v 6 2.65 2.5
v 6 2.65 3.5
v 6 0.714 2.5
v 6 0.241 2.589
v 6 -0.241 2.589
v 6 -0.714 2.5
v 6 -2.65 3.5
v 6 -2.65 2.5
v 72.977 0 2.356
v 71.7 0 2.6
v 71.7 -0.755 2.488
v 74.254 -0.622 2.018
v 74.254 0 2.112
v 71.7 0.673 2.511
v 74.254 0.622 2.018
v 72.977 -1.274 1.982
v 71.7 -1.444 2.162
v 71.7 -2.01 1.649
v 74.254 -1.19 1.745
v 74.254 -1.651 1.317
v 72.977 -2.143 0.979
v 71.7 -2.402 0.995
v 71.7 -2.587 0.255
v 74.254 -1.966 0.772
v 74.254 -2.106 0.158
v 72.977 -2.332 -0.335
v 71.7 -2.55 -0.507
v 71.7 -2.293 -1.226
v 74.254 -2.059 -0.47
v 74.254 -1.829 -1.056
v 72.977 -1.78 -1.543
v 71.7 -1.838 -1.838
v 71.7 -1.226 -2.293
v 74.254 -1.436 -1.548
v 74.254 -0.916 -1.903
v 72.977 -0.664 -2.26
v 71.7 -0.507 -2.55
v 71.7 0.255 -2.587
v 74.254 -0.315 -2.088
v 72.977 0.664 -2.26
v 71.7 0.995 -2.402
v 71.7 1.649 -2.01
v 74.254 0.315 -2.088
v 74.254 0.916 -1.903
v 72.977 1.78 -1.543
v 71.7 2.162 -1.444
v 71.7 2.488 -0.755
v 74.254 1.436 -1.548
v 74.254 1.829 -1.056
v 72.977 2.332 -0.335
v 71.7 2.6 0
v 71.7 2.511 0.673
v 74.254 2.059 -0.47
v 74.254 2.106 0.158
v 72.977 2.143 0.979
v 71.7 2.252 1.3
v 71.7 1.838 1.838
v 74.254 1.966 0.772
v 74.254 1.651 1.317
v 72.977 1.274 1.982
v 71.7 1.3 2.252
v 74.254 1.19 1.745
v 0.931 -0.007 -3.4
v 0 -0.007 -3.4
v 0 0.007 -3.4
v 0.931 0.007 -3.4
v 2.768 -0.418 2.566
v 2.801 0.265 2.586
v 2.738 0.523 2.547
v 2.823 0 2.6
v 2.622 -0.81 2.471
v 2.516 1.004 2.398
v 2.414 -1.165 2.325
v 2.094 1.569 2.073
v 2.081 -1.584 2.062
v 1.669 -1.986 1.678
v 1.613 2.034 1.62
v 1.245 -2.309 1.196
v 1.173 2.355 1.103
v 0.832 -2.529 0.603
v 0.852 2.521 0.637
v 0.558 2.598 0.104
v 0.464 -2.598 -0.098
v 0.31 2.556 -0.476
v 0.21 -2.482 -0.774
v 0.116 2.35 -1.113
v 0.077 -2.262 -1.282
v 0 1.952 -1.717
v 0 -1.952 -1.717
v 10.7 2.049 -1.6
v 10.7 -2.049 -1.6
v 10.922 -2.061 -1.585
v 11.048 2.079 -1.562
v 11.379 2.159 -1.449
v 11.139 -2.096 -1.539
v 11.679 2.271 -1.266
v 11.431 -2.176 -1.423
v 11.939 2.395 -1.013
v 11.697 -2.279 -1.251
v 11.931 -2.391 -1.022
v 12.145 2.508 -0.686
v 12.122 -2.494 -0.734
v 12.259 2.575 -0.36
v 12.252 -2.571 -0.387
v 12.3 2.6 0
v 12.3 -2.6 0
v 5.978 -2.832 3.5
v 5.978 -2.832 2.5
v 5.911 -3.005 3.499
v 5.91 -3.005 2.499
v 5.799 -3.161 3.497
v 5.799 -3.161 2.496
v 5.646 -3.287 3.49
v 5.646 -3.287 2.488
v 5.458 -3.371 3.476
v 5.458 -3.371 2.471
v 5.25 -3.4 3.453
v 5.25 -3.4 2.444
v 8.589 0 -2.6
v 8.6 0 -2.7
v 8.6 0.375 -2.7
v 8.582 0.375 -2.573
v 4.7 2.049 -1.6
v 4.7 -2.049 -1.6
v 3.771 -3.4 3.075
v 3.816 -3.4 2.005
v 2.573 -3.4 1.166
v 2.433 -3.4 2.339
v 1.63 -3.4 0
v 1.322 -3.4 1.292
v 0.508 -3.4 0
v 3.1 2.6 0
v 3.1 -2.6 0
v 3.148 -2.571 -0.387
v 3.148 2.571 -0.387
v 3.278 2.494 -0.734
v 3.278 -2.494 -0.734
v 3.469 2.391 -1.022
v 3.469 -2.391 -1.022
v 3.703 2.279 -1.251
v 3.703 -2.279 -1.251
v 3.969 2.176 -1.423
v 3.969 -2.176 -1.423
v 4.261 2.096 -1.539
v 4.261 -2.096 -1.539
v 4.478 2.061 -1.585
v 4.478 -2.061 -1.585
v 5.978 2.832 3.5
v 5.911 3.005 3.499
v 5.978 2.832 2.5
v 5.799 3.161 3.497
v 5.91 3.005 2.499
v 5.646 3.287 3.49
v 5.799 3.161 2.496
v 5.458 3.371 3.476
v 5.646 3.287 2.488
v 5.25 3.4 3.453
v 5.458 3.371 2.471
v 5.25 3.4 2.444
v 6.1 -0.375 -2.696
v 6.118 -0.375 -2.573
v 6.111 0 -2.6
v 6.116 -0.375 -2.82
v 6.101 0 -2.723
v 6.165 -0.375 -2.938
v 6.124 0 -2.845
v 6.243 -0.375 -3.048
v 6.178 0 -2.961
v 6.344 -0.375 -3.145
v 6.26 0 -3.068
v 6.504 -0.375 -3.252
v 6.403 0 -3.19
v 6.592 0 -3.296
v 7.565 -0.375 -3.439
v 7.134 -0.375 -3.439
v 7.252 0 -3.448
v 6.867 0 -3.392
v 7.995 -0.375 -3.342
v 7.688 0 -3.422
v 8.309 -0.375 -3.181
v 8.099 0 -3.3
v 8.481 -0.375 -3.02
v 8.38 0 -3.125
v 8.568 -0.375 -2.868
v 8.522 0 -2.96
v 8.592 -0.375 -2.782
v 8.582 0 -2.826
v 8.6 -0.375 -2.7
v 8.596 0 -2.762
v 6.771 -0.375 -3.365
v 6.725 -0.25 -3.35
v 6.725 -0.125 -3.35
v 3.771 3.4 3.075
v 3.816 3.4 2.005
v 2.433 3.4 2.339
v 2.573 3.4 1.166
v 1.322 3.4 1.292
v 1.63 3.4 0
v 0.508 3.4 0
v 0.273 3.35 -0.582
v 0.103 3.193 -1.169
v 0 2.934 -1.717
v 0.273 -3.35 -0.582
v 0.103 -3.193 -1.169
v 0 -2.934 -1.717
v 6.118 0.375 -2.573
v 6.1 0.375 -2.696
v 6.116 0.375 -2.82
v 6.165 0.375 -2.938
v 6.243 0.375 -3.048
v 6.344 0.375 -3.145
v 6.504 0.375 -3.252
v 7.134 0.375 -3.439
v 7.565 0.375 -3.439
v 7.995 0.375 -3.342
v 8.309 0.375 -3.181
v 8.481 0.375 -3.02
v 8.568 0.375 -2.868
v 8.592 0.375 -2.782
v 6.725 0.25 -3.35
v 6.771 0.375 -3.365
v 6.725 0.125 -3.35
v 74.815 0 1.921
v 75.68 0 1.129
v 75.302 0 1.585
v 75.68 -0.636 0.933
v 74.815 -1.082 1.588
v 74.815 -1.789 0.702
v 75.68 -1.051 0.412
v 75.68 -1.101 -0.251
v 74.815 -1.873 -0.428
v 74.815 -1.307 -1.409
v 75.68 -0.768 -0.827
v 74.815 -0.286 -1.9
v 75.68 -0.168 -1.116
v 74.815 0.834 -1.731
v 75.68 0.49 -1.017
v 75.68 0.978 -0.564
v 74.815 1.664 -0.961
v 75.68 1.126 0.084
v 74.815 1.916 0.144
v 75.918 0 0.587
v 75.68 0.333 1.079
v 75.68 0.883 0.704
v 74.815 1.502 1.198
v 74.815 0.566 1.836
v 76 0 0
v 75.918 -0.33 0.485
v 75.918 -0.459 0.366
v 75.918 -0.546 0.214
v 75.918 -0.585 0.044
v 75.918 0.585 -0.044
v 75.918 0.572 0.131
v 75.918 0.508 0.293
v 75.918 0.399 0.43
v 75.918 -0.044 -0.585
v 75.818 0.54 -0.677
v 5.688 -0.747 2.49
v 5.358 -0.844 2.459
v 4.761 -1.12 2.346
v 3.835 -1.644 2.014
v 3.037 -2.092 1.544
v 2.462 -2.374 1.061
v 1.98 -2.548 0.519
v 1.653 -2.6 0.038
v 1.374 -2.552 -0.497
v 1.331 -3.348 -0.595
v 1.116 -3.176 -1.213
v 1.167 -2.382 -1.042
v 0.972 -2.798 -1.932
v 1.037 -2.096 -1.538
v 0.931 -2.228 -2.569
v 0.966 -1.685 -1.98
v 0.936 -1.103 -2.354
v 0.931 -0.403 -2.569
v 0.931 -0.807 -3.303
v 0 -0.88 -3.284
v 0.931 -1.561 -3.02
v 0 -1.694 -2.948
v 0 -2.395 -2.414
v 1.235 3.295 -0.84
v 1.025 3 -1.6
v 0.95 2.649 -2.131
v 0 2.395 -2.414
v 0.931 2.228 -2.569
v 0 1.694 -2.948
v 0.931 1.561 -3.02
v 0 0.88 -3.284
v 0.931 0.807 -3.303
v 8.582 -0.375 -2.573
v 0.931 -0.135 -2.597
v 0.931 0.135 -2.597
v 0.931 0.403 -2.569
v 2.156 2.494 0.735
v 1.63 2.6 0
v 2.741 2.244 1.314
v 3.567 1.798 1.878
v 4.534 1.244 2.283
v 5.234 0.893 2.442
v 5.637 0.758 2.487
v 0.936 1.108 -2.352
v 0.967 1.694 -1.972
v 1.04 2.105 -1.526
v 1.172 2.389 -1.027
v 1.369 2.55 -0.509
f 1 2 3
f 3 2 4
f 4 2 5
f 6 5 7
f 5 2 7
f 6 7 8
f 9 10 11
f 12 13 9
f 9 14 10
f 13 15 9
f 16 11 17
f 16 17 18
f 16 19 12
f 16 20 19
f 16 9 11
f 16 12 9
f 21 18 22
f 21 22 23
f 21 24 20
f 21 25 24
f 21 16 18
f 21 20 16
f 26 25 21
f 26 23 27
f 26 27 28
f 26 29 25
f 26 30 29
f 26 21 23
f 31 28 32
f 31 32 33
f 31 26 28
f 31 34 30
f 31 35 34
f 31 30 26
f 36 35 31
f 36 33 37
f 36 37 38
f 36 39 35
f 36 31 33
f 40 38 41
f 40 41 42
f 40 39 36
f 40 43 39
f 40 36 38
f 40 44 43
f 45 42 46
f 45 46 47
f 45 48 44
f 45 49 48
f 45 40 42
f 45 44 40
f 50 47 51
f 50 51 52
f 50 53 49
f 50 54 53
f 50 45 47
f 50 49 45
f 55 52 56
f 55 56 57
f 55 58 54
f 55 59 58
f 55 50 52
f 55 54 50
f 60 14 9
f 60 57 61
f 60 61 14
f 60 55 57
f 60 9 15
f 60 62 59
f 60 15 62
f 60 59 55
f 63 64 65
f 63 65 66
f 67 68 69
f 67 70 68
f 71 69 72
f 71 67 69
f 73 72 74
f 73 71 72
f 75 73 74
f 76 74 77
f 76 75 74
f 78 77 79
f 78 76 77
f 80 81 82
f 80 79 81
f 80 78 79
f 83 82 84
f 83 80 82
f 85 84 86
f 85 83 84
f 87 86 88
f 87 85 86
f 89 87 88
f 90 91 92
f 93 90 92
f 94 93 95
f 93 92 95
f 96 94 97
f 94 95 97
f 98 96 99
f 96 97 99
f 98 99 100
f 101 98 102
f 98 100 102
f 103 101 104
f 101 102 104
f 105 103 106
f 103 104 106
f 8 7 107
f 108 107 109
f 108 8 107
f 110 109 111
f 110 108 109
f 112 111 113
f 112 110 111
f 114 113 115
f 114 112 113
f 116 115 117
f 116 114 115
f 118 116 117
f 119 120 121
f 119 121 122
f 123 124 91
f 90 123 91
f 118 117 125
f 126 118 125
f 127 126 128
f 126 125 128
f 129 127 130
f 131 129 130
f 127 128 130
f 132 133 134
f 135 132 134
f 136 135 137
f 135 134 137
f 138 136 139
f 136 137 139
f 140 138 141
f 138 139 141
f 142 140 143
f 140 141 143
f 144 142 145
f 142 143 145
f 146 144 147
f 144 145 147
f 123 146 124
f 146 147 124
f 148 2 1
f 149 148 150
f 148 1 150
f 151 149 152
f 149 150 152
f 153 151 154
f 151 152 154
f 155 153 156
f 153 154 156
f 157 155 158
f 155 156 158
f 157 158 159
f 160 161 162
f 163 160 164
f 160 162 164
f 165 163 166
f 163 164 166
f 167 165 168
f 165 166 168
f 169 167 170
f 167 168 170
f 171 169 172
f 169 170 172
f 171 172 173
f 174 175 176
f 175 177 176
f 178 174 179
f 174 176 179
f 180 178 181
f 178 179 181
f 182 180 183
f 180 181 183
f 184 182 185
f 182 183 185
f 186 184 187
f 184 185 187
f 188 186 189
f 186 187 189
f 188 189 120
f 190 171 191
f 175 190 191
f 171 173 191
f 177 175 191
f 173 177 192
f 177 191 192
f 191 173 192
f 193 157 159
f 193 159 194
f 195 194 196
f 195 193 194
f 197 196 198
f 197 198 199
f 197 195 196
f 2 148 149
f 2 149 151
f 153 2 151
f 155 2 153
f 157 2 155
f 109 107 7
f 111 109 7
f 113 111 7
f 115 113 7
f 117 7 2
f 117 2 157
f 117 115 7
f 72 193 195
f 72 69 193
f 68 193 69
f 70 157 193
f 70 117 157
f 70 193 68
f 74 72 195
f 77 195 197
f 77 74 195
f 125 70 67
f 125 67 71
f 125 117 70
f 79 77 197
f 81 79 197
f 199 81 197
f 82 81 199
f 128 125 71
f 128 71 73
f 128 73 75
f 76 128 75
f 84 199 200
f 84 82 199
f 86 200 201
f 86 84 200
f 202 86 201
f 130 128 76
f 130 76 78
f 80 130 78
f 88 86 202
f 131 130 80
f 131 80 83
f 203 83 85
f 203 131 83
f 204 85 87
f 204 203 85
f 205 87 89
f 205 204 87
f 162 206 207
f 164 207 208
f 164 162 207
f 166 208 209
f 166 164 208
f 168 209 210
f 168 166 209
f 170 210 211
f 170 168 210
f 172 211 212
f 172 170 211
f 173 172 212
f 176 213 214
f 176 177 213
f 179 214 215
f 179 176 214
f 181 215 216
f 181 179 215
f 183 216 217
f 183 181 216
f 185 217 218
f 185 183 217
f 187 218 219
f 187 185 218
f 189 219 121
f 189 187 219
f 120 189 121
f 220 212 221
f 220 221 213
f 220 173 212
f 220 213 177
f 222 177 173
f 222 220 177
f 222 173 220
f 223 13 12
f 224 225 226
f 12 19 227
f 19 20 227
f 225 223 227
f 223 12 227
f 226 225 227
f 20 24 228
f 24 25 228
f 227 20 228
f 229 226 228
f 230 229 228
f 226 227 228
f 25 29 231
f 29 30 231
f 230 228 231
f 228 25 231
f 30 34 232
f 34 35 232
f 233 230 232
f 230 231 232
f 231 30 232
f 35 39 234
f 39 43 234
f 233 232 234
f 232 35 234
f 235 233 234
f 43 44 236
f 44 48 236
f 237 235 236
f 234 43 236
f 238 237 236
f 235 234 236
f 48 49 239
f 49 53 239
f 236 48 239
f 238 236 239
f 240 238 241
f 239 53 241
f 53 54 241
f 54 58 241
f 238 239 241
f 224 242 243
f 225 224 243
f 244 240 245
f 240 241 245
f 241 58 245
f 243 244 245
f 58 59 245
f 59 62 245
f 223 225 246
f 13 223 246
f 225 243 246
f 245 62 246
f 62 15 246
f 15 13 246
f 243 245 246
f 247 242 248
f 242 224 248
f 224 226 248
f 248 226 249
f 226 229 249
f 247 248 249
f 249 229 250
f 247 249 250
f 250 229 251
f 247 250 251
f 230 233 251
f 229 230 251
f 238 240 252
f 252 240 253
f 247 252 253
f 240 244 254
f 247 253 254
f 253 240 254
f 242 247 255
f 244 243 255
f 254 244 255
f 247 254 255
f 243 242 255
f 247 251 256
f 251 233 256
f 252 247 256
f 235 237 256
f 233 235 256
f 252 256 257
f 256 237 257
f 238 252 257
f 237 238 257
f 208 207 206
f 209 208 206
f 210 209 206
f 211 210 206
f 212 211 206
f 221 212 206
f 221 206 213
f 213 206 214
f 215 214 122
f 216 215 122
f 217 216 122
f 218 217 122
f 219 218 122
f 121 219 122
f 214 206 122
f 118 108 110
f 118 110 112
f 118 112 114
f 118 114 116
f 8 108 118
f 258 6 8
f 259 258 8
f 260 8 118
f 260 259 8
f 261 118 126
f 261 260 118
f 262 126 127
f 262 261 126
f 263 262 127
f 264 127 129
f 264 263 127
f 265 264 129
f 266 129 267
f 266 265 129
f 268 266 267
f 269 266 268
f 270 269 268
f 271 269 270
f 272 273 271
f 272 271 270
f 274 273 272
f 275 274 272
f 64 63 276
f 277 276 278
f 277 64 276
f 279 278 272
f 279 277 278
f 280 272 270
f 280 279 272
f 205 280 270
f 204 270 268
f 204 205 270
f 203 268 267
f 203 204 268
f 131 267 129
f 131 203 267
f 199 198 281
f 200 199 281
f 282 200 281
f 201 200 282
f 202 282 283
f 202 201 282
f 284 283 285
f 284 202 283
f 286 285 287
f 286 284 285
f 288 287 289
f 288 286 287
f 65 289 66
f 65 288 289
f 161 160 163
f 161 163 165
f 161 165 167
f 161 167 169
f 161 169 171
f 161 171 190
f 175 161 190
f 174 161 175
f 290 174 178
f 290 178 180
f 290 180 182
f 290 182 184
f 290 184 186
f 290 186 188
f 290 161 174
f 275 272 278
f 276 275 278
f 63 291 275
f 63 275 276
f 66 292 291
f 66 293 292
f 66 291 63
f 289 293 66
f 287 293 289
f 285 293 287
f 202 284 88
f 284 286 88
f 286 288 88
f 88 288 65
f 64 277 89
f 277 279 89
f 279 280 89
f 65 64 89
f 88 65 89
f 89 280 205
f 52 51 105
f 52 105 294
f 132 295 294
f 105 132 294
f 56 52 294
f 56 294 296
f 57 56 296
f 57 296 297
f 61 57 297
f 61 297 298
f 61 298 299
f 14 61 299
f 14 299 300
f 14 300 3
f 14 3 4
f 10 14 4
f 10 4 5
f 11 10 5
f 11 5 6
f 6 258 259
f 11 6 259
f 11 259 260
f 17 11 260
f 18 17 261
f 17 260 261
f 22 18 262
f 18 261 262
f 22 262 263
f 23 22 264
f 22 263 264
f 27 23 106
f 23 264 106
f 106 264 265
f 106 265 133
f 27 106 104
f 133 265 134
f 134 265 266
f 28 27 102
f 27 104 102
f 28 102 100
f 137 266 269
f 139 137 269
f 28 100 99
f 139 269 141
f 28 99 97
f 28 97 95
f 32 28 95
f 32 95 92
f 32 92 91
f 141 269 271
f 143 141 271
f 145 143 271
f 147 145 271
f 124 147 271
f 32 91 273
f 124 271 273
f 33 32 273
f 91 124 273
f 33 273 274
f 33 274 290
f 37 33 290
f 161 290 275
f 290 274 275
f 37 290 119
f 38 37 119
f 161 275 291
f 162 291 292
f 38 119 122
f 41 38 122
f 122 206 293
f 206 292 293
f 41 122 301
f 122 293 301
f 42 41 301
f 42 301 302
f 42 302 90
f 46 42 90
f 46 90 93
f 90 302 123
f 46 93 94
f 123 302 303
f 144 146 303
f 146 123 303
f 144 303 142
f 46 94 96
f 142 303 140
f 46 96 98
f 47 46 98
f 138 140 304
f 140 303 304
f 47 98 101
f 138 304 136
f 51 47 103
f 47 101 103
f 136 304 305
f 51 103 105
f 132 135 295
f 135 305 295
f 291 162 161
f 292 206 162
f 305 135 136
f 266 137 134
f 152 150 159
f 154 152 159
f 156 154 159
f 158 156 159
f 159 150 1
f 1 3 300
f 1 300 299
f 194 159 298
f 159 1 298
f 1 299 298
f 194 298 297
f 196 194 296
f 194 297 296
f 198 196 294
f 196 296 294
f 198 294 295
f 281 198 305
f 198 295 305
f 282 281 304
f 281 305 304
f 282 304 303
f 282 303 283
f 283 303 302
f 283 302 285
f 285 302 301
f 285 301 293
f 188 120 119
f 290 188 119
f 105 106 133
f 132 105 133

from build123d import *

# Parameters (mm, degrees)
SKETCH_R          = 2.6
PAD_DEPTH         = 76
PAD001_DEPTH      = 3.4
PAD001_DEPTH_BACK = 3.4
POCKET_DEPTH      = 10
POCKET001_DEPTH   = 5
PAD002_DEPTH      = 0.375
PAD002_DEPTH_BACK = 0.375
POCKET002_DEPTH   = 10
FILLET_R          = 0.75


with BuildPart() as part:
    # Sketch → Pad (new body)
    with BuildSketch(Plane.YZ):
        Circle(SKETCH_R)
    extrude(amount=PAD_DEPTH)

    # Sketch001 → Pad001 (join, two sides)
    with BuildSketch(Plane.XZ) as pad001_sk:
        with BuildLine():
            Line((6, 3.5), (6, 2.5))
            ThreePointArc((6, 2.5), (2.415927, 1.015429), (0.931356, -2.568644))
            Line((0.931356, -2.568644), (0.931356, -3.4))
            Line((0, -3.4), (0.931356, -3.4))
            Line((0, -3.4), (0, -1.717397))
            ThreePointArc((6, 3.5), (2.024412, 2.013227), (0, -1.717397))
        make_face()
    extrude(amount=PAD001_DEPTH)
    extrude(pad001_sk.sketch, amount=-PAD001_DEPTH_BACK)

    # Sketch002 (on Face8 of Pad001) → Pocket (cut)
    with BuildSketch(Plane(origin=(0, -3.4, 0), x_dir=(0, 0, -1), z_dir=(0, -1, 0))):
        with BuildLine():
            Line((3.4, 0), (3.4, -1))
            Line((3.4, -1), (-4.5, -1))
            Line((-4.5, -1), (-4.5, 6))
            Line((-4.5, 6), (-3.5, 6))
            ThreePointArc((-3.5, 6), (-2.013227, 2.024412), (1.717397, 0))
            Line((1.717397, 0), (3.4, 0))
        make_face()
    extrude(amount=-POCKET_DEPTH, mode=Mode.SUBTRACT)

    # Sketch003 (on Face10 of Pocket) → Pocket001 (cut)
    with BuildSketch(Plane(origin=(0, 0, 0), x_dir=(0, 1, 0), z_dir=(-1, 0, 0))):
        with BuildLine():
            Line((-3.4, 0), (-4.4, 0))
            Line((-4.4, 0), (-4.4, 5))
            Line((-4.4, 5), (4.4, 5))
            Line((4.4, 5), (4.4, 0))
            Line((4.4, 0), (3.4, 0))
            ThreePointArc((3.4, 0), (0, 3.400008), (-3.4, 0))
        make_face()
    extrude(amount=-POCKET001_DEPTH, mode=Mode.SUBTRACT)

    # Sketch004 → Pad002 (join, two sides)
    with BuildSketch(Plane.XZ) as pad002_sk:
        with BuildLine():
            add(Edge.make_bspline(
                [(8.6, -2.7), (8.6, -1.400962), (6.725, -2.050481), (4.85, -2.7), (6.725, -3.349519), (8.6, -3.999038), (8.6, -2.7)],
                knots=[0, 0, 0, 2.094395, 2.094395, 4.18879, 4.18879, 6.283185, 6.283185, 6.283185], degree=2, weights=[1, 0.5, 1, 0.5, 1, 0.5, 1]))
        make_face()
    extrude(amount=PAD002_DEPTH)
    extrude(pad002_sk.sketch, amount=-PAD002_DEPTH_BACK)

    # Sketch005 (on Face7 of Pad002) → Pocket002 (cut)
    with BuildSketch(Plane(origin=(0, -3.4, 0), x_dir=(0, 0, -1), z_dir=(0, -1, 0))):
        with BuildLine():
            Line((1.6, 4.7), (1.6, 10.7))
            ThreePointArc((1.6, 10.7), (1.131371, 11.831371), (0, 12.3))
            Line((0, 12.3), (0, 3.1))
            ThreePointArc((0, 3.1), (1.131371, 3.568629), (1.6, 4.7))
        make_face()
    extrude(amount=-POCKET002_DEPTH, mode=Mode.SUBTRACT)

    # Fillet
    fillet_edges = [part.edges().sort_by_distance(p)[0] for p in [
        (6, 3.4, 3),
        (6, -3.4, 3),
    ]]
    fillet(fillet_edges, radius=FILLET_R)

    # Sketch006 → Groove (revolve, cut)
    with BuildSketch(Plane.XZ):
        with BuildLine():
            ThreePointArc((76, 0), (75.506887, 1.370118), (74.253745, 2.11175))
            Line((71.7, 2.6), (74.253745, 2.11175))
            Line((76, 2.6), (71.7, 2.6))
            Line((76, 2.6), (77, 2.6))
            Line((77, 2.6), (77, 0))
            Line((77, 0), (76, 0))
        make_face()
    revolve(axis=Axis((0, 0, 0), (1, 0, 0)), mode=Mode.SUBTRACT)


solid = part.part
